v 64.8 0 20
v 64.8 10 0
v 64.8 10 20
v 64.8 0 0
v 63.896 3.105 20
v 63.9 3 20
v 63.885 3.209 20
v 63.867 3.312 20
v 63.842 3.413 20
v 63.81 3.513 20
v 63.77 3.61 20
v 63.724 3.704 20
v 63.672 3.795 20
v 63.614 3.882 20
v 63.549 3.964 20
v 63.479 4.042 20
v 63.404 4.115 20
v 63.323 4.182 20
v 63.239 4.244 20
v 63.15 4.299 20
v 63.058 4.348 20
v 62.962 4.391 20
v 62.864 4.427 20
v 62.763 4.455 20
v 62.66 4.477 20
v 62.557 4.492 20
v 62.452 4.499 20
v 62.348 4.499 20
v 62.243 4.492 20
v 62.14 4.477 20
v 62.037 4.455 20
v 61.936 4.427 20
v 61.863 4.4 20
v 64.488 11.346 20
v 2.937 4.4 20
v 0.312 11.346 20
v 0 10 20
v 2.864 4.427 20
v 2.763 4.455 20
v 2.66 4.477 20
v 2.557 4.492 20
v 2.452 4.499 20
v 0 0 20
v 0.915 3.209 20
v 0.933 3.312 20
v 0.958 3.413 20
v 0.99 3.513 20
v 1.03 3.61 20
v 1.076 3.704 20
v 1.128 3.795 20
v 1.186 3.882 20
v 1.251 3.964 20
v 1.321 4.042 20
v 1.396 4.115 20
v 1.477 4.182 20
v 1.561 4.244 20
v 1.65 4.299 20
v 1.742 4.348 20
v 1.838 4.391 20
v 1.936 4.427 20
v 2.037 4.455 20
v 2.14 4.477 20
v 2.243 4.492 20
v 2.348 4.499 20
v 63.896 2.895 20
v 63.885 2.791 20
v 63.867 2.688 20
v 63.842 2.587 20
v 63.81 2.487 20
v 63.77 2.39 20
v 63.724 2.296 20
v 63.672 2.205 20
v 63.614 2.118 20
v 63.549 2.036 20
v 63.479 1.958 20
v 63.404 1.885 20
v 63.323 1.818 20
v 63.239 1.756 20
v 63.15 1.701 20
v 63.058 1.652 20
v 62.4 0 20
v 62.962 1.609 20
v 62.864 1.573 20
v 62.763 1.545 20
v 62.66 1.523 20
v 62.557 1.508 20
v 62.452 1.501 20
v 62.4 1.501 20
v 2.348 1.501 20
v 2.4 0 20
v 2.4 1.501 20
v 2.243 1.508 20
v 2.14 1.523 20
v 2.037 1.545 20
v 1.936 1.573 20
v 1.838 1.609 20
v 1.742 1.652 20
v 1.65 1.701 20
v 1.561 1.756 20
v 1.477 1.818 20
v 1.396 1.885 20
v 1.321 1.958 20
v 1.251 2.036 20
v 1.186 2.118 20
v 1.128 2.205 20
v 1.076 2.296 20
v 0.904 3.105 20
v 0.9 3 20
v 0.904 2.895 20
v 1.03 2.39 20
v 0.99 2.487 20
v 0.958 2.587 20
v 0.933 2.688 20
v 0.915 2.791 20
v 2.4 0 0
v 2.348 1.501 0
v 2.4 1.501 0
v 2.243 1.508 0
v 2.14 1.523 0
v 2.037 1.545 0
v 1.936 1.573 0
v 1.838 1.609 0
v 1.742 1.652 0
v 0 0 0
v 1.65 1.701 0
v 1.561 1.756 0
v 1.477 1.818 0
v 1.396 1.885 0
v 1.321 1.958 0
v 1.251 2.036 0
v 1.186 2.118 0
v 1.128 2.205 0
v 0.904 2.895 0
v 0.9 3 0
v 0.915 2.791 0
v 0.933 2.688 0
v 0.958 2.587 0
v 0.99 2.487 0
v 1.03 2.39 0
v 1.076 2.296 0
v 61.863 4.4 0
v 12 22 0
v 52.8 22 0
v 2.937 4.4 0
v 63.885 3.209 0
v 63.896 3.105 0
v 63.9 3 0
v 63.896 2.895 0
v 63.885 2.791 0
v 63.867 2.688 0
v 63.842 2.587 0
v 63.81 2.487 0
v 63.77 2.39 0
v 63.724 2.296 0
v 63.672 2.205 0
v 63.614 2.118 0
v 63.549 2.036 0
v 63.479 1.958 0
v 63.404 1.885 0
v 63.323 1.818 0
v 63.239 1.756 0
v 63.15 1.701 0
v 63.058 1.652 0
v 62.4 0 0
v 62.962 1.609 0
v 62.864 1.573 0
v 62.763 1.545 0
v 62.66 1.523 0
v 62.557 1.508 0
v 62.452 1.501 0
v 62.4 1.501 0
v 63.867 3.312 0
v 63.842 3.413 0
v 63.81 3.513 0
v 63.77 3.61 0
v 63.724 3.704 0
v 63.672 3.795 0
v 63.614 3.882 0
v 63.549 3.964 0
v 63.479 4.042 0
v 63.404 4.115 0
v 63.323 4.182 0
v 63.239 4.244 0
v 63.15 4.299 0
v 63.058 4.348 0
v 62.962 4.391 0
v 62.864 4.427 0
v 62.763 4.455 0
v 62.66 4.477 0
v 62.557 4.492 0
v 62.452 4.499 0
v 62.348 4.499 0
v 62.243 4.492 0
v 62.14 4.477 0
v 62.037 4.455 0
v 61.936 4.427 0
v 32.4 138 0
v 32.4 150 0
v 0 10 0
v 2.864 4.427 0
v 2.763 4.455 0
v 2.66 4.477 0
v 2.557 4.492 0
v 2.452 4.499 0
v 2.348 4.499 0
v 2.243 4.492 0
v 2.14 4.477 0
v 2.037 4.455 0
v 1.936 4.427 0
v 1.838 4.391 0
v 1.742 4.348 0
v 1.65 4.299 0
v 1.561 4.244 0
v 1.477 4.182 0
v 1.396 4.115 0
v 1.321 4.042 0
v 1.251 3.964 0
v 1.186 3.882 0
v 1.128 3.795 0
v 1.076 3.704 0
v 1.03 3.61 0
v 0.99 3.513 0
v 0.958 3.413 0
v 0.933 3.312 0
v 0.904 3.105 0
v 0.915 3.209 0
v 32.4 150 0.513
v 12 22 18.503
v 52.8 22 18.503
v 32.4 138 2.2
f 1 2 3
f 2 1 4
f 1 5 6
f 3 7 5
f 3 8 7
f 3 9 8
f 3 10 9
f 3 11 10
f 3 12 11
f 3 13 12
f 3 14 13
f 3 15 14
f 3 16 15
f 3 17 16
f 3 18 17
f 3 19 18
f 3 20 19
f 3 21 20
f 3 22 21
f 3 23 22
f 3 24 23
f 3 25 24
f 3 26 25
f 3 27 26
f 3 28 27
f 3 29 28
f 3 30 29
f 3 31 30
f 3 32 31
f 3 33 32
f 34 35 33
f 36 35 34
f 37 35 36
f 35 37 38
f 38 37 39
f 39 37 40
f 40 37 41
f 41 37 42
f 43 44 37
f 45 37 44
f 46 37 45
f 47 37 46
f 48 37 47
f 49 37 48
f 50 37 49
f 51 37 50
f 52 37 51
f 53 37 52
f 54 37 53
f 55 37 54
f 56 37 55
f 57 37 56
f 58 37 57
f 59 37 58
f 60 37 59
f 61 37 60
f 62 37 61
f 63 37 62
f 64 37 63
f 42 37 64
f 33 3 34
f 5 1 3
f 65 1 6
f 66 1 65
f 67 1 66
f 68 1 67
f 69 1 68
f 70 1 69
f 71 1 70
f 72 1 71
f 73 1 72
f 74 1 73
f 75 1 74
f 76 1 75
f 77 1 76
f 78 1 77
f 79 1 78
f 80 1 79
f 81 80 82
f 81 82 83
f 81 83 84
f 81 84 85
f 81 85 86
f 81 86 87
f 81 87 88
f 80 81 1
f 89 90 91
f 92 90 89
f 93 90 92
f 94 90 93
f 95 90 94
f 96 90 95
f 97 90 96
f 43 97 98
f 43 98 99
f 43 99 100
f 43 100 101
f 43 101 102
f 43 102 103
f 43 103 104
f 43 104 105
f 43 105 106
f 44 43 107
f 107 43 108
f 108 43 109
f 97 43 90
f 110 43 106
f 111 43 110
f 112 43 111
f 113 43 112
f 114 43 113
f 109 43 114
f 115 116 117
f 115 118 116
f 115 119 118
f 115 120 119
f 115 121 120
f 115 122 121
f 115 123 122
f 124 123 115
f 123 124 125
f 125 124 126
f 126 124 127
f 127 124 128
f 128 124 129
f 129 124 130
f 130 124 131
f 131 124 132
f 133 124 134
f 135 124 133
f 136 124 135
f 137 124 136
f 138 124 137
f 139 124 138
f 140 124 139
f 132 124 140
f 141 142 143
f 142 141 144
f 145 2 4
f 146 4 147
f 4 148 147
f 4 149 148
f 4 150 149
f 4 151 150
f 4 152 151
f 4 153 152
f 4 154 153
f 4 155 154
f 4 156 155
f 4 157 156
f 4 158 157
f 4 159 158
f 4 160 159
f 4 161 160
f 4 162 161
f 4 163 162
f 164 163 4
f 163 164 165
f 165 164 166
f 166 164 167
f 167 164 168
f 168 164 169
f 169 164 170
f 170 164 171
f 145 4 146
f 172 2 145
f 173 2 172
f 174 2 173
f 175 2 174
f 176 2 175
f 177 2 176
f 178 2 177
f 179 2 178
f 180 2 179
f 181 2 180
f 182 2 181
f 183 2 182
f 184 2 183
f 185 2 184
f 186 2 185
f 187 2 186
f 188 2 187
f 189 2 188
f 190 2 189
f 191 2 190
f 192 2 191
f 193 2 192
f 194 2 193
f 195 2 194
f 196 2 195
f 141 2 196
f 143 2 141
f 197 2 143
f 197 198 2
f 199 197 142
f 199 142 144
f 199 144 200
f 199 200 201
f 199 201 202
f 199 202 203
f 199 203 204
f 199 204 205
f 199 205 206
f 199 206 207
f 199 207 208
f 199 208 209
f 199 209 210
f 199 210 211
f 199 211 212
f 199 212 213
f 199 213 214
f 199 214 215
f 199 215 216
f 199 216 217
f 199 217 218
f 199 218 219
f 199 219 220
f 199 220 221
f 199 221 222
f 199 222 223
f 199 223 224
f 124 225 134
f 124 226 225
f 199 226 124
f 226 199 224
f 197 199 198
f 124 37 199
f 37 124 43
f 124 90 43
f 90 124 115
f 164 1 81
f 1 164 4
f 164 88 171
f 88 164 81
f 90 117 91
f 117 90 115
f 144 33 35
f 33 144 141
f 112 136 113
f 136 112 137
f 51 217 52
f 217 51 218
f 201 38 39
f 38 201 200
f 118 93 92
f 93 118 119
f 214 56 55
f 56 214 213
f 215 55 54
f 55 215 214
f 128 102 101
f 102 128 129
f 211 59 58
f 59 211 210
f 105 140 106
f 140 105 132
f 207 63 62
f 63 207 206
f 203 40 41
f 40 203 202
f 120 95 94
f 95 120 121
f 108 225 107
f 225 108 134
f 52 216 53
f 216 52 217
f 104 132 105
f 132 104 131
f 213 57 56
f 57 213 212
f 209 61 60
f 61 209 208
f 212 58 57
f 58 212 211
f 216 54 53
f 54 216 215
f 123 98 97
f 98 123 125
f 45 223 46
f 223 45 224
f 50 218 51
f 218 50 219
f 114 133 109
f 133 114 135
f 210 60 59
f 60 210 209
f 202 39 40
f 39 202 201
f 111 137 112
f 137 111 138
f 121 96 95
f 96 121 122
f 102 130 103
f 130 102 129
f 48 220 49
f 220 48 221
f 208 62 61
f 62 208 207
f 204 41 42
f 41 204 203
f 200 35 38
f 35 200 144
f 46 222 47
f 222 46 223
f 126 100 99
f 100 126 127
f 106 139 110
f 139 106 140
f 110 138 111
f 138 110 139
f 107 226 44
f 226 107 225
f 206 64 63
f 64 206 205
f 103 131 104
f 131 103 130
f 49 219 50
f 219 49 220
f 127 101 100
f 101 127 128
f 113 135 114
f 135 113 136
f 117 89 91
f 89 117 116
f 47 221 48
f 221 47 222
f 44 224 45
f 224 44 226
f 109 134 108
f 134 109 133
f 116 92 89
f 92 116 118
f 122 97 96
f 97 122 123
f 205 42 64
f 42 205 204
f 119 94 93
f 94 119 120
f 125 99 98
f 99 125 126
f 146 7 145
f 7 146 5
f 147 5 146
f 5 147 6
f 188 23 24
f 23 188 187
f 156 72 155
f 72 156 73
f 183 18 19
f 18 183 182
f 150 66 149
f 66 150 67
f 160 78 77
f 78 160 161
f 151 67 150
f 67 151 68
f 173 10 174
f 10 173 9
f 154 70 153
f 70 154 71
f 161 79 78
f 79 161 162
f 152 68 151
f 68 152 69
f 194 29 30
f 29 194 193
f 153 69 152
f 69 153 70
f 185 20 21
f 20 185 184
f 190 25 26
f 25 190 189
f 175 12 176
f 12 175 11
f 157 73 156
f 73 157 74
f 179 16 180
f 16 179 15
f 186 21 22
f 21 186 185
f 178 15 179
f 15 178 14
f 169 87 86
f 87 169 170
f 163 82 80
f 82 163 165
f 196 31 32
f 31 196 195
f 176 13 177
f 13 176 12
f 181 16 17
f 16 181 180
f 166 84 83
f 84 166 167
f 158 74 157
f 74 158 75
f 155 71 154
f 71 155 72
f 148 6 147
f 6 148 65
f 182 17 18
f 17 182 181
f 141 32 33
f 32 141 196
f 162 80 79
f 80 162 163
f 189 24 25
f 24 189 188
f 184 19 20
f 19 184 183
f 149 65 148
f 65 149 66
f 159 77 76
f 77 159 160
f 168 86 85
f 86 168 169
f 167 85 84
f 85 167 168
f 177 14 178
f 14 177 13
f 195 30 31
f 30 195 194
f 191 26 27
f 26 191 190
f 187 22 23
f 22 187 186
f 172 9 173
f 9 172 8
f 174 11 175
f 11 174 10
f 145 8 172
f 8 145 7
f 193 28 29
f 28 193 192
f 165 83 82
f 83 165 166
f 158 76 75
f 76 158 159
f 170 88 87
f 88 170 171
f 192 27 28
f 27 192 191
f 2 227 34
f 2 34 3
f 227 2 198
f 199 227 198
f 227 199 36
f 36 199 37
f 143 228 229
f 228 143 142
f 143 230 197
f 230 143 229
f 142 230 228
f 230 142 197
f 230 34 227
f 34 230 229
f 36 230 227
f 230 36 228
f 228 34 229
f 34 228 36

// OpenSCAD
// file: ../../modules/fillet.scad
module fillet(r, l) {
  difference() {
    cube([r, r, l]);
    translate([0, 0, -.1]) cylinder(h = l + .2, r = r);
  }
}
// main file
include <../../modules/fillet.scad>

$fa=4; // default minimum facet angle is now 0.5
$fs=0.05; // default minimum facet size is now 0.05 mm


railDiam = 3;
width = 20;
railDistance = 30;
wallThickness = 2.4;
height = 10;

bookendHeight = 150;

difference() {
  cube([railDistance * 2 + wallThickness * 2, height, width]);
  translate([wallThickness, -.1, -.1]) cube([railDistance * 2, railDiam * 1.5, width + .2]);
  translate([wallThickness, railDiam, -.1]) cylinder(r = railDiam / 2, h = width + .2);
  translate([wallThickness + railDistance * 2, railDiam, -.1]) cylinder(r = railDiam / 2, h = width + .2);
}

difference() {
  linear_extrude(width) {
    polygon(points = [[0, height], [railDistance + wallThickness, bookendHeight], [railDistance * 2 + wallThickness * 2, height]], paths=[[0, 1, 2]]);
  }
  translate([0, 0, -.1]) linear_extrude(width + .2) {
    polygon(points = [[12, height + 12], [railDistance + wallThickness, bookendHeight - 12], [railDistance * 2 + wallThickness * 2 - 12, height + 12]], paths=[[0, 1, 2]]);
  }
  translate([-10, -10, 23]) rotate([-8, 0, 0]) cube([100, 200, 25]);
}
